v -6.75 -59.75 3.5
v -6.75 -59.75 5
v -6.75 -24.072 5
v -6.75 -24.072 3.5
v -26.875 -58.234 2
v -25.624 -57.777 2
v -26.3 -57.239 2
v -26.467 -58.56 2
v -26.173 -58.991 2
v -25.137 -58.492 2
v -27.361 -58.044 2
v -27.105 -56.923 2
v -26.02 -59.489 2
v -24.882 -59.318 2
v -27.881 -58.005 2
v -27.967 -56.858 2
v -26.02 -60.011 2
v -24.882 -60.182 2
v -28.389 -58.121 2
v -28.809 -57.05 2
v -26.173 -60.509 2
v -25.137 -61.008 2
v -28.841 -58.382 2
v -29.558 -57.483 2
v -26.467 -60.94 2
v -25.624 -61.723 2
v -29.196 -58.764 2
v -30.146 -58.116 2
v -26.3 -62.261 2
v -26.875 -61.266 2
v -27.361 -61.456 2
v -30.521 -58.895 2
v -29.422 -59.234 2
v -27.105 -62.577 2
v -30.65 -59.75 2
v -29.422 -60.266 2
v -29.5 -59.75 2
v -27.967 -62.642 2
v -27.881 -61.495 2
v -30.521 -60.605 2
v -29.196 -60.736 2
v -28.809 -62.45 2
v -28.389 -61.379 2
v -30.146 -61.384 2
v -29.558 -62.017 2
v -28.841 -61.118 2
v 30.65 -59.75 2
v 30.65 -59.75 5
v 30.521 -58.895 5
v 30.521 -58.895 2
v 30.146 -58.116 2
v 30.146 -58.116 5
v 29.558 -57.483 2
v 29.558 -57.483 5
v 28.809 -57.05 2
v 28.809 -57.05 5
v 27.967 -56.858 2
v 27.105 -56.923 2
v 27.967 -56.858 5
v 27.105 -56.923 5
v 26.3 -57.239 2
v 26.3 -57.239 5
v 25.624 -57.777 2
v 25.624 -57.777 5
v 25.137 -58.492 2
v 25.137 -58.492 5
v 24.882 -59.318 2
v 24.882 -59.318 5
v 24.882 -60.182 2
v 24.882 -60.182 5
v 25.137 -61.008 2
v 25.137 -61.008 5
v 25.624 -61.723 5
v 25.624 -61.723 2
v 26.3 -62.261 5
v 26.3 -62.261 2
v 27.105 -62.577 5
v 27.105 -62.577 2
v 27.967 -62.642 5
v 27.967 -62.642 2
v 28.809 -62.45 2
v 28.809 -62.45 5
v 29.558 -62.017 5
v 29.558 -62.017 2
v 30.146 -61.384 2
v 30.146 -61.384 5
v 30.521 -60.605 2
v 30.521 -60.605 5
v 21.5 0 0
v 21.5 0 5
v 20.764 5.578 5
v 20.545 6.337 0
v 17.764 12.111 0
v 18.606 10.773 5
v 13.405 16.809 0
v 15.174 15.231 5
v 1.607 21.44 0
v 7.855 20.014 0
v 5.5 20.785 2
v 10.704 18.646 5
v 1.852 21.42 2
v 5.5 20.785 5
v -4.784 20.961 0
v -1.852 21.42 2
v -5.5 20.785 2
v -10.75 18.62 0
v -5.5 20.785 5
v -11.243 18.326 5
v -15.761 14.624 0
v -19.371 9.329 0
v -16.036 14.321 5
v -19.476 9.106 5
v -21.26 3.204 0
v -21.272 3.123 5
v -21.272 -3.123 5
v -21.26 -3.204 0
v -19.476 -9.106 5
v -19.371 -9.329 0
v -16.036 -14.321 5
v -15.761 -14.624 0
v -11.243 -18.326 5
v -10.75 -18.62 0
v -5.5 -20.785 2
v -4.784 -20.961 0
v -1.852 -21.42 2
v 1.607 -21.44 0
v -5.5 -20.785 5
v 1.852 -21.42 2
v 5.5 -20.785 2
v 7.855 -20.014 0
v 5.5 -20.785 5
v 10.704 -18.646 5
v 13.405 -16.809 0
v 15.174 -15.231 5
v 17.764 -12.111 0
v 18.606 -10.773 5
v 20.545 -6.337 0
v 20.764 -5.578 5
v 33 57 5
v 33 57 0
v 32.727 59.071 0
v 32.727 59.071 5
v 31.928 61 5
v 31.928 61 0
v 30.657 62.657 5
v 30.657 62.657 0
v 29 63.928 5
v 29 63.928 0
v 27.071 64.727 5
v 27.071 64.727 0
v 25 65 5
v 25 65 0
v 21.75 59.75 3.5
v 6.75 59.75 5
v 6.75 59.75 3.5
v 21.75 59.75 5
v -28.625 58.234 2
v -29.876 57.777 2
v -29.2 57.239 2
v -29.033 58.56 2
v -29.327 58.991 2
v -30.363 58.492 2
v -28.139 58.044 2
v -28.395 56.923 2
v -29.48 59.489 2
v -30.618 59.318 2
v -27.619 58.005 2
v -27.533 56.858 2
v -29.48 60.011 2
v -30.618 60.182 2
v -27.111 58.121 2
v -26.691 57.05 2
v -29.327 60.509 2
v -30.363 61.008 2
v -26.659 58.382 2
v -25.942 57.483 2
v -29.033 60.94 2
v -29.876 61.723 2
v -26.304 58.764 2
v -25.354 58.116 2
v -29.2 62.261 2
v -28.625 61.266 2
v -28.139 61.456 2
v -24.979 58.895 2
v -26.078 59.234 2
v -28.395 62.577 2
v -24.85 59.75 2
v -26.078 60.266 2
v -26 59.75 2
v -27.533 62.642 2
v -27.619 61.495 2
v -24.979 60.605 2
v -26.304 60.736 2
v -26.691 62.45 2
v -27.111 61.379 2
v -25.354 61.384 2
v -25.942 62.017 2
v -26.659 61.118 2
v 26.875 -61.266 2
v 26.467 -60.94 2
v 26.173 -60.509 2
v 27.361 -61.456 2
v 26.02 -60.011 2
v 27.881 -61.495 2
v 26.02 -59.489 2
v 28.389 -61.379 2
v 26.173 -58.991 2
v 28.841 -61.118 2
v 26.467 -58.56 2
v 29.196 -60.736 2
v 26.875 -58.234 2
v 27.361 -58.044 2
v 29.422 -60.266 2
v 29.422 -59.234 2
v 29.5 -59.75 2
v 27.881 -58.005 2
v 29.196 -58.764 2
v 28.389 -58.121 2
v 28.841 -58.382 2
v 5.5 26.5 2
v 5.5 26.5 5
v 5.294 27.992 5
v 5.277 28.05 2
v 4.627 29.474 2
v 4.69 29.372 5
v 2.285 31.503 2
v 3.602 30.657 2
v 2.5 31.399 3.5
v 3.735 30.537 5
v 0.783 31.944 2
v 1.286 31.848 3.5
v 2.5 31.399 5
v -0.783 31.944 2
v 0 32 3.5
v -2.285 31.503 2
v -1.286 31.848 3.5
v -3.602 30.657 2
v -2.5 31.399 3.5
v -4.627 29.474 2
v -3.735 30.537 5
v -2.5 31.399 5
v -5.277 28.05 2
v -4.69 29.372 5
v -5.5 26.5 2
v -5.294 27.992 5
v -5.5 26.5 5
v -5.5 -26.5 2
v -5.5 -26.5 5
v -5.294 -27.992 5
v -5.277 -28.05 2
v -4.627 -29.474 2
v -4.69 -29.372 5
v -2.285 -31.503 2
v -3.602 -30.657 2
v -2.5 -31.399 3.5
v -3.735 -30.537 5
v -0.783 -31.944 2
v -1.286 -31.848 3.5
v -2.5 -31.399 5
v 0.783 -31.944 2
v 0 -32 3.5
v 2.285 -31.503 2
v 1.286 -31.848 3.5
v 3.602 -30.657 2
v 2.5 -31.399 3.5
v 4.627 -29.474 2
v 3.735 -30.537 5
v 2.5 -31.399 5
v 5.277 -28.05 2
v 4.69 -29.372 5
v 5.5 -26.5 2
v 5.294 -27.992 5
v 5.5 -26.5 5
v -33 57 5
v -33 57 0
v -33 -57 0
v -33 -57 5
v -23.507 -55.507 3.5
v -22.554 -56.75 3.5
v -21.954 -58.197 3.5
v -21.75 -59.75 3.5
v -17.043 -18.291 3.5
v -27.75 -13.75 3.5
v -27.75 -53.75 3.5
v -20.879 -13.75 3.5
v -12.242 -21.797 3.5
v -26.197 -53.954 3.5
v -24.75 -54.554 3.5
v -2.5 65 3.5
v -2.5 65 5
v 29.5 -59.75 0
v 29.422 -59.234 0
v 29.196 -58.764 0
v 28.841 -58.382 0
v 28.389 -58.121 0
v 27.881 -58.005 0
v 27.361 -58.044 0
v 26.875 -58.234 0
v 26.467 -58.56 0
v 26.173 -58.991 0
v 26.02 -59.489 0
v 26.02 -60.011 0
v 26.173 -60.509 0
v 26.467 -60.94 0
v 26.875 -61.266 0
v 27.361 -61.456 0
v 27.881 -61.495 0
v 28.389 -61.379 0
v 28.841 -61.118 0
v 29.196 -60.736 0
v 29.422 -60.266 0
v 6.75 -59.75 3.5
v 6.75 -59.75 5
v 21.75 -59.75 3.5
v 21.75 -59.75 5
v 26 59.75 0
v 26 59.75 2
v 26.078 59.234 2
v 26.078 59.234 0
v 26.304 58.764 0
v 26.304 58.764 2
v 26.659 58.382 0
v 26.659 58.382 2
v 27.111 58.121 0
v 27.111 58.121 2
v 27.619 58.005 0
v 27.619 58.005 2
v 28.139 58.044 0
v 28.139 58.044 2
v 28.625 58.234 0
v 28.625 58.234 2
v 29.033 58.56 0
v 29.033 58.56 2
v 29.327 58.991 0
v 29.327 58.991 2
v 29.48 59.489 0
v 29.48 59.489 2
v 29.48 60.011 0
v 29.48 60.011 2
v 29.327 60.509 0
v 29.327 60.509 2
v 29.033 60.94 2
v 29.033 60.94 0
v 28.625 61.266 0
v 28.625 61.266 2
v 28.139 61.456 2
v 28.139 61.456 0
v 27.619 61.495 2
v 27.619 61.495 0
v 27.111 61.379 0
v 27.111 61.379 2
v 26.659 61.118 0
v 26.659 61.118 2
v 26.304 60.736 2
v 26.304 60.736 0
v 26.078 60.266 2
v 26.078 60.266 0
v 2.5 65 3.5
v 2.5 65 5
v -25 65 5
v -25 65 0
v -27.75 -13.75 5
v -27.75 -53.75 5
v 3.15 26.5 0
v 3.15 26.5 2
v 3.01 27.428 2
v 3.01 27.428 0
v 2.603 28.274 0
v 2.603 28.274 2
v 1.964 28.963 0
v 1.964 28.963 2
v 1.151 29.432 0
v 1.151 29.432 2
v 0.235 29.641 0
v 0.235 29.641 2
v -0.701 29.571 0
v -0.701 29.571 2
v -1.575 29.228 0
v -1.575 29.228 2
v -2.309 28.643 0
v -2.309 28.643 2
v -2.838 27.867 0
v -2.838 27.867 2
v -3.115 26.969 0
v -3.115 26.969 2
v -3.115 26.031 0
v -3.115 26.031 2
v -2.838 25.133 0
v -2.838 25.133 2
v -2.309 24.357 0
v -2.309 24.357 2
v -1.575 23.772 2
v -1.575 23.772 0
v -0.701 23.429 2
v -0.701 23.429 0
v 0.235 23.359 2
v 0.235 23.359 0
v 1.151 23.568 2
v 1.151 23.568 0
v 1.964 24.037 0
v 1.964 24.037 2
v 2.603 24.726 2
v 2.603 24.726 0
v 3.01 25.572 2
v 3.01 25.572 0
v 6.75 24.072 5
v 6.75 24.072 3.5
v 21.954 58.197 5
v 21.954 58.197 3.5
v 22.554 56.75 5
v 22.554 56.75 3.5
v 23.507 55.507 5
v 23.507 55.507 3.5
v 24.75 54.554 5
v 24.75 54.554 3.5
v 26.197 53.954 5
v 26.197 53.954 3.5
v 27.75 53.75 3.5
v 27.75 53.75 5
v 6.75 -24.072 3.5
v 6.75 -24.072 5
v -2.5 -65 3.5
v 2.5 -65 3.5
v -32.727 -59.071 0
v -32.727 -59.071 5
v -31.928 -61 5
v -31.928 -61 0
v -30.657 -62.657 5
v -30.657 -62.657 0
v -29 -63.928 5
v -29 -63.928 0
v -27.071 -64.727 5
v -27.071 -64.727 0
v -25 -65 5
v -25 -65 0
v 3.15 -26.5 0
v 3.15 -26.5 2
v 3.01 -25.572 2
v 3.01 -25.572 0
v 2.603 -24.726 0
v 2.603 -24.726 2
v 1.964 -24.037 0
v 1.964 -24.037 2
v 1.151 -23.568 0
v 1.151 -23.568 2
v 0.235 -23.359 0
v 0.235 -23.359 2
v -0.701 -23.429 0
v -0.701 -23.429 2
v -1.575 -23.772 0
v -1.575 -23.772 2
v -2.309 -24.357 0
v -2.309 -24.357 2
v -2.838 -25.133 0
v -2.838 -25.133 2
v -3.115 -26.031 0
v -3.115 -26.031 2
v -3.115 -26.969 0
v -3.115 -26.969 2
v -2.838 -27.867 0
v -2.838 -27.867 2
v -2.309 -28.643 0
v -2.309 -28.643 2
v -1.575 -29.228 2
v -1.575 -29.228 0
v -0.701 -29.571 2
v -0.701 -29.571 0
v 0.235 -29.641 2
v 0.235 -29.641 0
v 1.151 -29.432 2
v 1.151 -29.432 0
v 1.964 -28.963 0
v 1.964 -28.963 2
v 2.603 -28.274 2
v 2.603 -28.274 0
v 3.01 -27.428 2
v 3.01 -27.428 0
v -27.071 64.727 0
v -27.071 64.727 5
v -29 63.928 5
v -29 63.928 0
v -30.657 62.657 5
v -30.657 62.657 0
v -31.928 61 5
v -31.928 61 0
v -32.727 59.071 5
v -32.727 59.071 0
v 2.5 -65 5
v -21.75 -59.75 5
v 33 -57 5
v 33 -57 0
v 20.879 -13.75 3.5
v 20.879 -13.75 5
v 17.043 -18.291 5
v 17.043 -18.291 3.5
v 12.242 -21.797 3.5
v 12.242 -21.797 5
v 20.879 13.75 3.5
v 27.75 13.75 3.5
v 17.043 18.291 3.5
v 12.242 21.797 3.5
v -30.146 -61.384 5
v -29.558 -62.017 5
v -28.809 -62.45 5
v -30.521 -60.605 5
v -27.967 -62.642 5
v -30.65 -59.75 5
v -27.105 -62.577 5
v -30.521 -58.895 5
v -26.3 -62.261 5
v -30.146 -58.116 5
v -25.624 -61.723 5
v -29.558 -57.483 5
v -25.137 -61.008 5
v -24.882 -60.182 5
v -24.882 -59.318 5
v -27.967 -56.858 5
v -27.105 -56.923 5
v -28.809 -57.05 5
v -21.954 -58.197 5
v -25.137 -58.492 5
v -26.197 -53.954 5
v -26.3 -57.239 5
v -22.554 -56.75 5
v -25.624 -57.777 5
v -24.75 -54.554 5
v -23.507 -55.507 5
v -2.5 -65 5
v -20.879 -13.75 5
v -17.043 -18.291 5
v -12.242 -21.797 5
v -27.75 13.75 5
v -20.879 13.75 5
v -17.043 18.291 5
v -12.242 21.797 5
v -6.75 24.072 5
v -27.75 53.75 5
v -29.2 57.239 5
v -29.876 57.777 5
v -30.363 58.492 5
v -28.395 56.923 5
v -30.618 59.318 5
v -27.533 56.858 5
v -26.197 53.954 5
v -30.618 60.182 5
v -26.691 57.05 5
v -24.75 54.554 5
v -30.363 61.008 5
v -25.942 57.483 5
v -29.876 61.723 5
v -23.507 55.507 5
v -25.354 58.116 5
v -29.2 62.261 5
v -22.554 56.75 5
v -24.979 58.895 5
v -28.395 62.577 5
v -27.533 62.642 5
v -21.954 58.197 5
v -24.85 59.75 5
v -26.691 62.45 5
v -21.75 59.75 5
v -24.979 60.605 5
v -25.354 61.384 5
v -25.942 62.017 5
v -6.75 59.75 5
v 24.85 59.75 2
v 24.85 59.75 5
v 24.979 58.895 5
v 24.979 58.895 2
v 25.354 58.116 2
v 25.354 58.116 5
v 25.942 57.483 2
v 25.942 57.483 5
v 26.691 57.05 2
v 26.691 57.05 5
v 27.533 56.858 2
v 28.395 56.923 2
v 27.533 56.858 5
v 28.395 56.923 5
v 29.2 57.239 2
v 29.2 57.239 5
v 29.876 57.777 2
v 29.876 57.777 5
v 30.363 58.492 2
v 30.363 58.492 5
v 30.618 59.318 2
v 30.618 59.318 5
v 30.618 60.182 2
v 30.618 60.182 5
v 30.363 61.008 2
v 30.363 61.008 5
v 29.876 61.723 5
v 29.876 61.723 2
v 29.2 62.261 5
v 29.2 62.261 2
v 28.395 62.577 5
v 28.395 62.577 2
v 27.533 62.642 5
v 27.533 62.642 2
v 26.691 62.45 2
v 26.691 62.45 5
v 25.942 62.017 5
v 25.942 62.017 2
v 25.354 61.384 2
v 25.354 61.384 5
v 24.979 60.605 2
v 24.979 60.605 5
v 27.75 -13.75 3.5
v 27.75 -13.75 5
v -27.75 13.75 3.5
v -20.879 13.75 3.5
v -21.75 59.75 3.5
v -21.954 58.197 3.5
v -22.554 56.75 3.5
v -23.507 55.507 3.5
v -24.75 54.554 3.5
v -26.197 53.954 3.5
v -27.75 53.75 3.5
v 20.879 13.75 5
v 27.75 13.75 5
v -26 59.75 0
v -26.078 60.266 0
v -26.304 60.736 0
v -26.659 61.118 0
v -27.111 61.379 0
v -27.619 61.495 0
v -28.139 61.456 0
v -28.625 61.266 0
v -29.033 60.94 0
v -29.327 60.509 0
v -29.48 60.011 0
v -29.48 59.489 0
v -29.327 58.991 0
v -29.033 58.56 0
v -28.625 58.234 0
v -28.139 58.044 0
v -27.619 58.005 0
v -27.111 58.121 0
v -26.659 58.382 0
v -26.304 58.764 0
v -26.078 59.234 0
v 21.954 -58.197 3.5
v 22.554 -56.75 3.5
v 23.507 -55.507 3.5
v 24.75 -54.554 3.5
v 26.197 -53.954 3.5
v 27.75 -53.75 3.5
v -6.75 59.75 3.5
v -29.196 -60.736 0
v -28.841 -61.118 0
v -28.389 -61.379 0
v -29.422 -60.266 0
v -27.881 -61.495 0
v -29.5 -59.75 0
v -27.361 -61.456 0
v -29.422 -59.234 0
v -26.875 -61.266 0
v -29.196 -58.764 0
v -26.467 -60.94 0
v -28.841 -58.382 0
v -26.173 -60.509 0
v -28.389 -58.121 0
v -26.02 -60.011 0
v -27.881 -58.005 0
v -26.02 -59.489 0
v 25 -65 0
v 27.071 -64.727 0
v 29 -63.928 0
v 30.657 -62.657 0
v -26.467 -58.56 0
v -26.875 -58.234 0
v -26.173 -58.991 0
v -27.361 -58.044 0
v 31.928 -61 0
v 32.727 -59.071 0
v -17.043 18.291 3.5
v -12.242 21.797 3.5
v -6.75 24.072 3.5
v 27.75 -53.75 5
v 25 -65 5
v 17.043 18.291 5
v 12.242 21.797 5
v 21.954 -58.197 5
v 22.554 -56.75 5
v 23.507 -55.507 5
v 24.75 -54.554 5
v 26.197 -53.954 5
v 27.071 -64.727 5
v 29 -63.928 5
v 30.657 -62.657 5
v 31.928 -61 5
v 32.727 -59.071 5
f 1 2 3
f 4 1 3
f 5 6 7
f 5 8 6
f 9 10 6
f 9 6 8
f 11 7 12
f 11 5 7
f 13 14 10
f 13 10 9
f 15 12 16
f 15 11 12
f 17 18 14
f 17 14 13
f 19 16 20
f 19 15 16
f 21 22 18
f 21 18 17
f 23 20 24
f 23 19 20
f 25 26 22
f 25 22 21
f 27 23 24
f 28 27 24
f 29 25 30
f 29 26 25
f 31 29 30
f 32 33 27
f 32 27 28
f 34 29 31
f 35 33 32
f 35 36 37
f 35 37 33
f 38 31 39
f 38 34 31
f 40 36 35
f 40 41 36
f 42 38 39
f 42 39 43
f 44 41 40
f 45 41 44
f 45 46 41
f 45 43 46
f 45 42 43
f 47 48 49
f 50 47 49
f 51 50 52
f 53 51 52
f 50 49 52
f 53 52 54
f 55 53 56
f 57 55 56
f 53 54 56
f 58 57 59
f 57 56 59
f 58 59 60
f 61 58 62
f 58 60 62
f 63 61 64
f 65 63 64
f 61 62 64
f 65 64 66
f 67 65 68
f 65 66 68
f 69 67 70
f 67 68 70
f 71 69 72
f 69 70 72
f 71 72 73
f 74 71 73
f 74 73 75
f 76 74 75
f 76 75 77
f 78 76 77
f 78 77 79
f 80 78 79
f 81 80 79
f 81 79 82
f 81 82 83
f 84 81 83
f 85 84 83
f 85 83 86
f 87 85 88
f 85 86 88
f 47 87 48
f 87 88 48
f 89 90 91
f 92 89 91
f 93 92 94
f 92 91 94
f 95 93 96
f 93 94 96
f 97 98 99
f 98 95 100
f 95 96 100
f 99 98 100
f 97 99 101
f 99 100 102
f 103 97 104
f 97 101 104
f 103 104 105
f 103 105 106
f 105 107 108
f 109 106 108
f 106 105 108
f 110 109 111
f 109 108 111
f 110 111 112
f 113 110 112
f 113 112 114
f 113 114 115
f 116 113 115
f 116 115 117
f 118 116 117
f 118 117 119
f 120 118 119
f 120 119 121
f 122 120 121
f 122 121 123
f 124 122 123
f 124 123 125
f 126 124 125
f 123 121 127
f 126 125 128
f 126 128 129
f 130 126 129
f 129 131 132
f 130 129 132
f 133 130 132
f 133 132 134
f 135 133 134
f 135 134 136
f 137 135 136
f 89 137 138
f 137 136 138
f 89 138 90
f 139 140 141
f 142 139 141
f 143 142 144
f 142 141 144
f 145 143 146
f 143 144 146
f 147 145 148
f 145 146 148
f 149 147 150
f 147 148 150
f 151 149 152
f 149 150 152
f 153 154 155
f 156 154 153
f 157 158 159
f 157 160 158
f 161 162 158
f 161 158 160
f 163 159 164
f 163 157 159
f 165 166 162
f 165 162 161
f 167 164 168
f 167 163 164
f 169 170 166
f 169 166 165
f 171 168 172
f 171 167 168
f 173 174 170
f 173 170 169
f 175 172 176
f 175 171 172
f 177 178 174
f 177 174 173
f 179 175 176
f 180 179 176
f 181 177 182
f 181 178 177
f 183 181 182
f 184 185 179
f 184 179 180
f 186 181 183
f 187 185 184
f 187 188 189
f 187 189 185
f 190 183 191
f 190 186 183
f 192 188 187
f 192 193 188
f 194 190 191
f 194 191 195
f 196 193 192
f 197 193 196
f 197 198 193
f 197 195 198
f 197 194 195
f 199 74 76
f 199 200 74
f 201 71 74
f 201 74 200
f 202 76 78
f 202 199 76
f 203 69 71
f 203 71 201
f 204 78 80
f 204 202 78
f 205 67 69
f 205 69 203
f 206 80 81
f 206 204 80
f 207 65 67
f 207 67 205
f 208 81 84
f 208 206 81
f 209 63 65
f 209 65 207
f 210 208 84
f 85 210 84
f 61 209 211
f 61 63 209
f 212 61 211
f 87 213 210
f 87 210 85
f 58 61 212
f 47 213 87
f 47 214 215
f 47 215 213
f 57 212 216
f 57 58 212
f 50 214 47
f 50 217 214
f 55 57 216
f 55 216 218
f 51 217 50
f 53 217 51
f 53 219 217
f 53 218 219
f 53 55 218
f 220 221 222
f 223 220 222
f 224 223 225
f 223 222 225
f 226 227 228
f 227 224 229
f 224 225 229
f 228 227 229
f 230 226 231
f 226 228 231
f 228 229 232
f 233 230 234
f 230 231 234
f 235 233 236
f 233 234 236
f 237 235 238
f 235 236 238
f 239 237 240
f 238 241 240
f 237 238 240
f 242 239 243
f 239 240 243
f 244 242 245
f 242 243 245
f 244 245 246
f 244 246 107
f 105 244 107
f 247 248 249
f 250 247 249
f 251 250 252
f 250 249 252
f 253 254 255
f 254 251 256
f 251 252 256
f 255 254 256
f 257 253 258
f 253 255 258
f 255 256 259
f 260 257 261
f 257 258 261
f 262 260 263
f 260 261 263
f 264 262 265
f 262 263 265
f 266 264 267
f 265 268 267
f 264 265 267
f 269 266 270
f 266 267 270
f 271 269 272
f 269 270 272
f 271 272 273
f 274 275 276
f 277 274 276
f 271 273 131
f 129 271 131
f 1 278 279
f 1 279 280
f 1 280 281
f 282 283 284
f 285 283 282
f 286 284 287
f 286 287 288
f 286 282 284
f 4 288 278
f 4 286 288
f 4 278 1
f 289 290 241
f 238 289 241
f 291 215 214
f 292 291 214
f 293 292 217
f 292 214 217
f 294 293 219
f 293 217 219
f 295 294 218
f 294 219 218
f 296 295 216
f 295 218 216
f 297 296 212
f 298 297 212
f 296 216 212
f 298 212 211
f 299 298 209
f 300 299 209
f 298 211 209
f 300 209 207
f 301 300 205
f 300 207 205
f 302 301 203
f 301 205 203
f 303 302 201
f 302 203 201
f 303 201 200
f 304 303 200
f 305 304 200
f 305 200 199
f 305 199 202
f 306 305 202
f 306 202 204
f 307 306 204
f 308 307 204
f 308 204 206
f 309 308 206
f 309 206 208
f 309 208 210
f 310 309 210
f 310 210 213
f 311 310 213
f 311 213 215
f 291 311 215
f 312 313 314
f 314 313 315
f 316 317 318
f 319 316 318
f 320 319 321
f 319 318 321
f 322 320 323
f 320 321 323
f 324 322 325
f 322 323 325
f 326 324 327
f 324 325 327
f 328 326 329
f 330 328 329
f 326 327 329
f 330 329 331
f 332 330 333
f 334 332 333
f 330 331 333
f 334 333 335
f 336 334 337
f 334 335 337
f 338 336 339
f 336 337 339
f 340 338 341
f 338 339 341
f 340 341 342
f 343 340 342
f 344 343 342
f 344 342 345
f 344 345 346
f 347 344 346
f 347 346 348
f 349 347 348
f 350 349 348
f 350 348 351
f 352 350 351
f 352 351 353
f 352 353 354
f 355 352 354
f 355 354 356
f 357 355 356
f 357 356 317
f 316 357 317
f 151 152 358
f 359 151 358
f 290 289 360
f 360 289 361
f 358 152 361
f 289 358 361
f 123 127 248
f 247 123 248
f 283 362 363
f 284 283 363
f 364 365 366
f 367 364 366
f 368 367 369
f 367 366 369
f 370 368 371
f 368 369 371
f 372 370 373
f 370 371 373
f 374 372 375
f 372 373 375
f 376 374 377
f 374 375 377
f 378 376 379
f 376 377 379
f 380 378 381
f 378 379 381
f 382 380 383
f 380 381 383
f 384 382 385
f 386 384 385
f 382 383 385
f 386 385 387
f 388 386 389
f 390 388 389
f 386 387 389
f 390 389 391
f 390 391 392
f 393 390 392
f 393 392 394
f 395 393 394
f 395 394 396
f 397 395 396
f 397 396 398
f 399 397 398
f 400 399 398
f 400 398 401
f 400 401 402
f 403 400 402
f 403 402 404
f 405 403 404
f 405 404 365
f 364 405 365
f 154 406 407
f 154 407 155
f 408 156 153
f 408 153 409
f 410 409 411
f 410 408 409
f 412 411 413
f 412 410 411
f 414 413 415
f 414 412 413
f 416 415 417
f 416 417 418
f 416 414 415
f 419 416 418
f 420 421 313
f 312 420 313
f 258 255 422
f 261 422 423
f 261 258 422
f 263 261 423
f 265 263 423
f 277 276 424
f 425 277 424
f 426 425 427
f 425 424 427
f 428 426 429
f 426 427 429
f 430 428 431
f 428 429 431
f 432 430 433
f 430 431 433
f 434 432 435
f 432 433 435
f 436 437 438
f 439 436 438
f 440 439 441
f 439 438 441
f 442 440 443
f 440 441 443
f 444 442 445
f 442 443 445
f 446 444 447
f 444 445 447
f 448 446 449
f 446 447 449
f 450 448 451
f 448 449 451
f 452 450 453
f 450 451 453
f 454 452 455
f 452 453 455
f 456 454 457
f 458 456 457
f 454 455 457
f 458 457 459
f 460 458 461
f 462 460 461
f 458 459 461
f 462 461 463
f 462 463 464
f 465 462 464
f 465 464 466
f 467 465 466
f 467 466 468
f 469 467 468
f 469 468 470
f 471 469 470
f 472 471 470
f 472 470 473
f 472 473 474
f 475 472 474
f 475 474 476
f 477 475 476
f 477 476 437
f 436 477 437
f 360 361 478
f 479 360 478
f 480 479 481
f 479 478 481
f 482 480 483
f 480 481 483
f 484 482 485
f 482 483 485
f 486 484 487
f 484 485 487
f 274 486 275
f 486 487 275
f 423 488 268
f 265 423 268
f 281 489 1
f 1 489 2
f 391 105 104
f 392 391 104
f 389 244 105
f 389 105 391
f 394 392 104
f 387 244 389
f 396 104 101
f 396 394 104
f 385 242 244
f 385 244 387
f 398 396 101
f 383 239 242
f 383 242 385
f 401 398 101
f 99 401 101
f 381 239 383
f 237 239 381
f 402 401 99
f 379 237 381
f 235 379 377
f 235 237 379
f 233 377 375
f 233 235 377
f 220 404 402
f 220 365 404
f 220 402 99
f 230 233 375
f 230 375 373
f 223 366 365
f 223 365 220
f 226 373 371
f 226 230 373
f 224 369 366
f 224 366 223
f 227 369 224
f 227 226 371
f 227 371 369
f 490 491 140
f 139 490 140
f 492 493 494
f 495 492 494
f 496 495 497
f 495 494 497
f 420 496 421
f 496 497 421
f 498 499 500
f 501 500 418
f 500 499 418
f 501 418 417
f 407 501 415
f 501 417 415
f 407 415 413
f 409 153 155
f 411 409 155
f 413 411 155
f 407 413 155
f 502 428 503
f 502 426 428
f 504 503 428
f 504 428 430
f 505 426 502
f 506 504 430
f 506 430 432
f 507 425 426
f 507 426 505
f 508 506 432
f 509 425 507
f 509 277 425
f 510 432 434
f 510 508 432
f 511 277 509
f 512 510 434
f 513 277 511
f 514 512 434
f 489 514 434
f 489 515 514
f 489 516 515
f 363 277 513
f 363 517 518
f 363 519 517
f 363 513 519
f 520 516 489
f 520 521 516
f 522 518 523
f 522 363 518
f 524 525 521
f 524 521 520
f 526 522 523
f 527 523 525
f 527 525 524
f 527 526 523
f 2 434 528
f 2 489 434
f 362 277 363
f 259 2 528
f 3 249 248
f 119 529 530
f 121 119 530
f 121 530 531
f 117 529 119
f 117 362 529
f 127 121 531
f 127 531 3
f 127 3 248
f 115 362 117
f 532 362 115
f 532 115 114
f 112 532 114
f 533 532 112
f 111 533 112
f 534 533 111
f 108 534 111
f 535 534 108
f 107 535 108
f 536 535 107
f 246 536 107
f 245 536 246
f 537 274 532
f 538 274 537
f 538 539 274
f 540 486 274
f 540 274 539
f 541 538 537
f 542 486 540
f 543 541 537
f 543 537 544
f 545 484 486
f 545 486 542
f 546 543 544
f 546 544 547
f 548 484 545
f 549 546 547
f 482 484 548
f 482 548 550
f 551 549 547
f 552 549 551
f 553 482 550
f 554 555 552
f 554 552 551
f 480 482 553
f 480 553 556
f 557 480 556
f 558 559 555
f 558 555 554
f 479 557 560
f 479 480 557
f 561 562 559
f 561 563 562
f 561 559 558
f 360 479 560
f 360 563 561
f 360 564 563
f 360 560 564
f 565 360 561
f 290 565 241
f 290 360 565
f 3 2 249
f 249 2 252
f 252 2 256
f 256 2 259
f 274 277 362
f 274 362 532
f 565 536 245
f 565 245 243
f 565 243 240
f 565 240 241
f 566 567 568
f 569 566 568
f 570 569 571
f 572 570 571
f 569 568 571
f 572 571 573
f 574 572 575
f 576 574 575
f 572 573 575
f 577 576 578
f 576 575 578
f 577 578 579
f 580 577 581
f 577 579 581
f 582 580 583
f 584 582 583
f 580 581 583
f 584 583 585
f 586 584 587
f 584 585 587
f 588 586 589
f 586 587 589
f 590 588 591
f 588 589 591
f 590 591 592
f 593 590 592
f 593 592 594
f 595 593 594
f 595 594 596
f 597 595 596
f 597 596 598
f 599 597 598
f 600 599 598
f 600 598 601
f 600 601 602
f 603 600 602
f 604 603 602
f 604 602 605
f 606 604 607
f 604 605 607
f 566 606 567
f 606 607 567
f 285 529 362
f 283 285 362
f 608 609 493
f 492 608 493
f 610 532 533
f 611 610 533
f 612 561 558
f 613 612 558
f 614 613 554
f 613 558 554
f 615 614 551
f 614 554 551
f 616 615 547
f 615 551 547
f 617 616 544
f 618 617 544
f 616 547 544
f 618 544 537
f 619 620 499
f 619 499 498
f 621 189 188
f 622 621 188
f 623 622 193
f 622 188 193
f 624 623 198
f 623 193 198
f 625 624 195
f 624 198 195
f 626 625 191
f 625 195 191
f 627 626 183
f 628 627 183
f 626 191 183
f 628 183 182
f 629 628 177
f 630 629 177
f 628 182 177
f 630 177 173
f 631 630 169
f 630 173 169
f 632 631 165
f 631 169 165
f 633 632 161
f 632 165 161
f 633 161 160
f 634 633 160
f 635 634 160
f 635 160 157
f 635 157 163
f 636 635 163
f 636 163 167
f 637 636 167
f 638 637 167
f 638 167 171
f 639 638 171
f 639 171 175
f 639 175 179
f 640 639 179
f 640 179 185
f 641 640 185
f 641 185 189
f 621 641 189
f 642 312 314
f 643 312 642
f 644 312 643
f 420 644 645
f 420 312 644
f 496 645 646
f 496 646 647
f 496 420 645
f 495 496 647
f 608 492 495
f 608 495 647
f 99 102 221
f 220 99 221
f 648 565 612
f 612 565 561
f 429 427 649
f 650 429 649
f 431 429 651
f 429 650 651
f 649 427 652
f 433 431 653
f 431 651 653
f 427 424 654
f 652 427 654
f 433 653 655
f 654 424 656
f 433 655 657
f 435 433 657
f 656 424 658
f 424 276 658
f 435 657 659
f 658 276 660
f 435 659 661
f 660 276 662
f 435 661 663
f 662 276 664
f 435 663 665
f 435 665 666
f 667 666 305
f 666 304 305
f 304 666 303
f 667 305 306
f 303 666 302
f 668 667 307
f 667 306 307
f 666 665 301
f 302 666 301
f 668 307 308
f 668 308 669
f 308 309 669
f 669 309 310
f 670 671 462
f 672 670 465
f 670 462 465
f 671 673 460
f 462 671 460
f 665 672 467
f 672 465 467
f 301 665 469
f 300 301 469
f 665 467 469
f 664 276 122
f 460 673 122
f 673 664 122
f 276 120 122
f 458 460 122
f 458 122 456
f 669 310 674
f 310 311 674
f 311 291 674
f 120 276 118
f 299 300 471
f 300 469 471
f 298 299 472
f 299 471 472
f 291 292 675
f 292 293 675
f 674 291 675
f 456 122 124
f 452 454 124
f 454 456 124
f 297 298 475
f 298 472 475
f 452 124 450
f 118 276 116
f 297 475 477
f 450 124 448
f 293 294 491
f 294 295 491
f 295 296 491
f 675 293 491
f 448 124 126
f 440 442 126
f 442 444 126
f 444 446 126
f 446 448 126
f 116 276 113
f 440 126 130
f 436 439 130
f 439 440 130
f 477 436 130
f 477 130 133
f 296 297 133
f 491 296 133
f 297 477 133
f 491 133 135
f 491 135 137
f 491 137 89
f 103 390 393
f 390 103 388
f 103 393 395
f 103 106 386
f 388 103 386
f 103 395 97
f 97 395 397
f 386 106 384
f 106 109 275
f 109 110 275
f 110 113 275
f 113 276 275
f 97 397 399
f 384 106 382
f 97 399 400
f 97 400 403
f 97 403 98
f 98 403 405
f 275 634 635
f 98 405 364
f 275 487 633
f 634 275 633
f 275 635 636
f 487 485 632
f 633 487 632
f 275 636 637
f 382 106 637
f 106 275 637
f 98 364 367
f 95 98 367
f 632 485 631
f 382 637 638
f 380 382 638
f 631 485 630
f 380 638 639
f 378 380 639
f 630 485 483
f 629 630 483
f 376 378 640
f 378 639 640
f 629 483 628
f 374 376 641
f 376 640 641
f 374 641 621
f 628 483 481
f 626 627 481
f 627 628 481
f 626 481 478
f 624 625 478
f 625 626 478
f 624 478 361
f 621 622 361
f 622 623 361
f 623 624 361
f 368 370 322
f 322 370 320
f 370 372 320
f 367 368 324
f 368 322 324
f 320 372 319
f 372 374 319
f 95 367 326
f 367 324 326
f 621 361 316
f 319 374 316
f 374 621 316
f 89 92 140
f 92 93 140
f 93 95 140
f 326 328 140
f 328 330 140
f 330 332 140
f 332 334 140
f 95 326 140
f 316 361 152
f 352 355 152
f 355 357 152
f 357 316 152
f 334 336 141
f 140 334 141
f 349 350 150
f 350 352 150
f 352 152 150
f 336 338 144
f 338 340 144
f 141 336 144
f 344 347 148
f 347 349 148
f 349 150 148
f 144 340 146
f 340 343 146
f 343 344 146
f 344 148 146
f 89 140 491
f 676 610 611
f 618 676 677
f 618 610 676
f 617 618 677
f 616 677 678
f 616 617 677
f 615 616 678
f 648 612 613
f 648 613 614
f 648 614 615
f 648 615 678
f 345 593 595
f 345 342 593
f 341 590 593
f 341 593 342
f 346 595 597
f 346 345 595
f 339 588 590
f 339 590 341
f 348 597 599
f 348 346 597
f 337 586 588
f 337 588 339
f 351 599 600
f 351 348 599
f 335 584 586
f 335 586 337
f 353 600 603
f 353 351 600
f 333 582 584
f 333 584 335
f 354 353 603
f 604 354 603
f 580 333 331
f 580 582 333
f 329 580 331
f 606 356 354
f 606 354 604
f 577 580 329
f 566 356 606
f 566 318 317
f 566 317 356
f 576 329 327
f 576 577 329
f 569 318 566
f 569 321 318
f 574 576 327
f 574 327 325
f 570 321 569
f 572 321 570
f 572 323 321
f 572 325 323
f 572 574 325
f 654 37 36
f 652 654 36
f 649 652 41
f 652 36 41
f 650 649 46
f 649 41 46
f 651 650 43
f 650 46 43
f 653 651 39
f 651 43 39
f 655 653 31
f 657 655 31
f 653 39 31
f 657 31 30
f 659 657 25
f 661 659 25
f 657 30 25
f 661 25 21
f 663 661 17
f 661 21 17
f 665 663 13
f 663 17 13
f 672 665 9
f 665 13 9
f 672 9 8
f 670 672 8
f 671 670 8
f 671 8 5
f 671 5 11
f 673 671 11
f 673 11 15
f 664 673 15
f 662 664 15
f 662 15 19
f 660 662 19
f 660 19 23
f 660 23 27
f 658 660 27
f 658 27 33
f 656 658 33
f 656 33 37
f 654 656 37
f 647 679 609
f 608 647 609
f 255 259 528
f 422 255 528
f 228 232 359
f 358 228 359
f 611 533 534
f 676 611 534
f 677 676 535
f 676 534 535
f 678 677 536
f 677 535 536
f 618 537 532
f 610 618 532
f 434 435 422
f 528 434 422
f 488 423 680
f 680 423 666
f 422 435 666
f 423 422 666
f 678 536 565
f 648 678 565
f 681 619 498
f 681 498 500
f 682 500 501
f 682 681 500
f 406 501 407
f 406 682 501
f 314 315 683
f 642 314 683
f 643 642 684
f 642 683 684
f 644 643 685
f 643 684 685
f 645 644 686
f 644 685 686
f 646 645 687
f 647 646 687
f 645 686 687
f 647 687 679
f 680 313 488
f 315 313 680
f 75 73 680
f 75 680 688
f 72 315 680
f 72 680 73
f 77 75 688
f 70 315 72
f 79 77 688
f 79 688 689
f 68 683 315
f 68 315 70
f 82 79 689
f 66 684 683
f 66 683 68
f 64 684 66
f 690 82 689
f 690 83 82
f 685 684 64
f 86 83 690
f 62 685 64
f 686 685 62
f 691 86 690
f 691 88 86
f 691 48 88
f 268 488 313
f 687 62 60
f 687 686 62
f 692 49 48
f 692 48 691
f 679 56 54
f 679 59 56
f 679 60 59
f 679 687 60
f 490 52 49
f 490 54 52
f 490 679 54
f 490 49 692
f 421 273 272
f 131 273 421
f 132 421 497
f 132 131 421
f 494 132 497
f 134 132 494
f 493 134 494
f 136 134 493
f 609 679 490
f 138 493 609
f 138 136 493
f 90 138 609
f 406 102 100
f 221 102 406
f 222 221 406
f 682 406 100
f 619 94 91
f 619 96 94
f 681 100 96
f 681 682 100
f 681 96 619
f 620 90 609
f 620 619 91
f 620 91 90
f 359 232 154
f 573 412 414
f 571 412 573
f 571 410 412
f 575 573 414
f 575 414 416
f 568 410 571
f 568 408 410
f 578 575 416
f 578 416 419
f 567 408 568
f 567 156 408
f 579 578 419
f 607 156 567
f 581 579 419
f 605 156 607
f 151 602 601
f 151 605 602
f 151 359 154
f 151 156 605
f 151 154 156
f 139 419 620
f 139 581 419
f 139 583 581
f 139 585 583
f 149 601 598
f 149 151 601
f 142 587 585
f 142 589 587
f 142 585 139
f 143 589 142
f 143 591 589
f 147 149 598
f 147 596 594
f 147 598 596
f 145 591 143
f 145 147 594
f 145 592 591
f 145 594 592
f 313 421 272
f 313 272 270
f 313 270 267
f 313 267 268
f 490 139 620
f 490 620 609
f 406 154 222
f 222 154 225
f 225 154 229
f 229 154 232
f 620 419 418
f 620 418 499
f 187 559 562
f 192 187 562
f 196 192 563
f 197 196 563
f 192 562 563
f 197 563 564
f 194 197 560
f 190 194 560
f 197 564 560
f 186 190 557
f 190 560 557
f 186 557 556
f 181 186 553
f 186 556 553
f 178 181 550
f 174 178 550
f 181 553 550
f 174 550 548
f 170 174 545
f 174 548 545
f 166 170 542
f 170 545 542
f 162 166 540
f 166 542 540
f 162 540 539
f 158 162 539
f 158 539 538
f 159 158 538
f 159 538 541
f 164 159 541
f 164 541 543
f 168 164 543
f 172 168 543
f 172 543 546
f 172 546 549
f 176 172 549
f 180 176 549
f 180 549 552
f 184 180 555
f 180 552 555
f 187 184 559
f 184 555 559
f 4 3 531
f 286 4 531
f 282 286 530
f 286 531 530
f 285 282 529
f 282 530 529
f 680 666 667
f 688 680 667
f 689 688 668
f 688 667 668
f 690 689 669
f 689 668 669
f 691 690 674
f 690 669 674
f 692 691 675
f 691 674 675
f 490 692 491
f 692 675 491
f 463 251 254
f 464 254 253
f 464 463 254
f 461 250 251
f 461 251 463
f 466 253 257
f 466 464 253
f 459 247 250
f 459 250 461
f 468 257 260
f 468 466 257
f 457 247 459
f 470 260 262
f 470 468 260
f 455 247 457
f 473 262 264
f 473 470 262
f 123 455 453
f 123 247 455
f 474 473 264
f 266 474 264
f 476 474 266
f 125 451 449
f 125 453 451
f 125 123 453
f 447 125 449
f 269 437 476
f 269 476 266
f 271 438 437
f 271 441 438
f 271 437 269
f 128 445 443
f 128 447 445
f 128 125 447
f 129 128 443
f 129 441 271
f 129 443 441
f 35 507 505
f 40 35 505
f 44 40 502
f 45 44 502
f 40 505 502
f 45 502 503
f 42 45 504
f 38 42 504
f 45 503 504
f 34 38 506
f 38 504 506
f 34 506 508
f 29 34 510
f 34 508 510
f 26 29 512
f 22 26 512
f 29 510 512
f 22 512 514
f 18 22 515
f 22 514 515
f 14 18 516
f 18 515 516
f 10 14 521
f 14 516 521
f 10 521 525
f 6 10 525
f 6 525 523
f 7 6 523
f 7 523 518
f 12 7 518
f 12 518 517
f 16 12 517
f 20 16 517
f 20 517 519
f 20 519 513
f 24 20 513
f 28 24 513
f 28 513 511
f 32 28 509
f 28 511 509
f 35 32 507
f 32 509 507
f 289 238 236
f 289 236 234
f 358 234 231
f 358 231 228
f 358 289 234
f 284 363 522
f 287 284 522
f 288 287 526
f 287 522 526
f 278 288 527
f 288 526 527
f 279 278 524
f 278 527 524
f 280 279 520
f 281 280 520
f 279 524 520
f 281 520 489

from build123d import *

# Parameters (mm, degrees)
BOSS_EXTRUDE1_DEPTH = 5
SKETCH2_R           = 21.5
CUT_EXTRUDE1_DEPTH  = 74.068461049
SKETCH3_R           = 3.15
CUT_EXTRUDE2_DEPTH  = 74.068461049
SKETCH12_R          = 2.9
CUT_EXTRUDE3_DEPTH  = 3
SKETCH13_R          = 1.75
CUT_EXTRUDE4_DEPTH  = 73.958892535
CUT_EXTRUDE5_DEPTH  = 3
CUT_EXTRUDE6_DEPTH  = 1.5


with BuildPart() as part:
    # Sketch1 → Boss-Extrude1 (new body)
    with BuildSketch(Plane.XY):
        with BuildLine():
            Line((25, 65), (-25, 65))
            ThreePointArc((-25, 65), (-30.656854249, 62.656854249), (-33, 57))
            Line((-33, 57), (-33, -57))
            ThreePointArc((-33, -57), (-30.656854249, -62.656854249), (-25, -65))
            Line((-25, -65), (25, -65))
            ThreePointArc((25, -65), (30.656854249, -62.656854249), (33, -57))
            Line((33, -57), (33, 57))
            ThreePointArc((33, 57), (30.656854249, 62.656854249), (25, 65))
        make_face()
    extrude(amount=BOSS_EXTRUDE1_DEPTH)

    # Sketch2 → Cut-Extrude1 (cut, through all)
    with BuildSketch(Plane.XY.offset(5)):
        Circle(SKETCH2_R)
    extrude(amount=-CUT_EXTRUDE1_DEPTH, mode=Mode.SUBTRACT)

    # Sketch3 → Cut-Extrude2 (cut, through all)
    with BuildSketch(Plane.XY.offset(5)):
        with Locations((0, 26.5)):
            Circle(SKETCH3_R)
        with Locations((0, -26.5)):
            Circle(SKETCH3_R)
    extrude(amount=-CUT_EXTRUDE2_DEPTH, mode=Mode.SUBTRACT)

    # Sketch12 → Cut-Extrude3 (cut)
    with BuildSketch(Plane.XY.offset(5)):
        with Locations((-27.75, 59.75)):
            Circle(SKETCH12_R)
        with Locations(Location((27.75, 59.75, 0), (0, 0, 180))):
            Circle(SKETCH12_R)
        with Locations(Location((-27.75, -59.75, 0), (0, 0, 180))):
            Circle(SKETCH12_R)
        with Locations((27.75, -59.75)):
            Circle(SKETCH12_R)
    extrude(amount=-CUT_EXTRUDE3_DEPTH, mode=Mode.SUBTRACT)

    # Sketch13 → Cut-Extrude4 (cut, through all)
    with BuildSketch(Plane.XY.offset(2)):
        with Locations((-27.75, 59.75)):
            Circle(SKETCH13_R)
        with Locations(Location((27.75, 59.75, 0), (0, 0, 180))):
            Circle(SKETCH13_R)
        with Locations((27.75, -59.75)):
            Circle(SKETCH13_R)
        with Locations(Location((-27.75, -59.75, 0), (0, 0, 180))):
            Circle(SKETCH13_R)
    extrude(amount=-CUT_EXTRUDE4_DEPTH, mode=Mode.SUBTRACT)

    # Sketch14 → Cut-Extrude5 (cut)
    with BuildSketch(Plane.XY.offset(5)):
        with BuildLine():
            Line((-5.5, 26.5), (-5.5, -26.5))
            ThreePointArc((-5.5, -26.5), (0, -32), (5.5, -26.5))
            Line((5.5, -26.5), (5.5, 26.5))
            ThreePointArc((5.5, 26.5), (0, 32), (-5.5, 26.5))
        make_face()
    extrude(amount=-CUT_EXTRUDE5_DEPTH, mode=Mode.SUBTRACT)

    # Sketch15 → Cut-Extrude6 (cut)
    with BuildSketch(Plane.XY.offset(5)):
        with BuildLine():
            Line((-2.5, 65), (-2.5, 31.398979486))
            ThreePointArc((-2.5, 31.398979486), (0, 32), (2.5, 31.398979486))
            Line((2.5, 31.398979486), (2.5, 65))
            Line((2.5, 65), (-2.5, 65))
        make_face()
        with BuildLine():
            Line((-27.75, 13.75), (-20.879116361, 13.75))
            ThreePointArc((-20.879116361, 13.75), (-14.747047157, 20.187238547), (-6.75, 24.071508054))
            Line((-6.75, 24.071508054), (-6.75, 59.75))
            Line((-6.75, 59.75), (-21.75, 59.75))
            ThreePointArc((-21.75, 59.75), (-23.507359313, 55.507359313), (-27.75, 53.75))
            Line((-27.75, 53.75), (-27.75, 13.75))
        make_face()
        with BuildLine():
            Line((27.75, 13.75), (20.879116361, 13.75))
            ThreePointArc((20.879116361, 13.75), (14.747047157, 20.187238547), (6.75, 24.071508054))
            Line((6.75, 24.071508054), (6.75, 59.75))
            Line((6.75, 59.75), (21.75, 59.75))
            ThreePointArc((21.75, 59.75), (23.507359313, 55.507359313), (27.75, 53.75))
            Line((27.75, 53.75), (27.75, 13.75))
        make_face()
        with BuildLine():
            Line((27.75, -53.75), (27.75, -13.75))
            Line((27.75, -13.75), (20.879116361, -13.75))
            ThreePointArc((20.879116361, -13.75), (14.747047157, -20.187238547), (6.75, -24.071508054))
            Line((6.75, -24.071508054), (6.75, -59.75))
            Line((6.75, -59.75), (21.75, -59.75))
            ThreePointArc((21.75, -59.75), (23.507359313, -55.507359313), (27.75, -53.75))
        make_face()
        with BuildLine():
            Line((2.5, -65), (2.5, -31.398979486))
            ThreePointArc((2.5, -31.398979486), (0, -32), (-2.5, -31.398979486))
            Line((-2.5, -31.398979486), (-2.5, -65))
            Line((-2.5, -65), (2.5, -65))
        make_face()
        with BuildLine():
            Line((-6.75, -59.75), (-6.75, -24.071508054))
            ThreePointArc((-6.75, -24.071508054), (-14.747047157, -20.187238547), (-20.879116361, -13.75))
            Line((-20.879116361, -13.75), (-27.75, -13.75))
            Line((-27.75, -13.75), (-27.75, -53.75))
            ThreePointArc((-27.75, -53.75), (-23.507359313, -55.507359313), (-21.75, -59.75))
            Line((-21.75, -59.75), (-6.75, -59.75))
        make_face()
    extrude(amount=-CUT_EXTRUDE6_DEPTH, mode=Mode.SUBTRACT)


solid = part.part
